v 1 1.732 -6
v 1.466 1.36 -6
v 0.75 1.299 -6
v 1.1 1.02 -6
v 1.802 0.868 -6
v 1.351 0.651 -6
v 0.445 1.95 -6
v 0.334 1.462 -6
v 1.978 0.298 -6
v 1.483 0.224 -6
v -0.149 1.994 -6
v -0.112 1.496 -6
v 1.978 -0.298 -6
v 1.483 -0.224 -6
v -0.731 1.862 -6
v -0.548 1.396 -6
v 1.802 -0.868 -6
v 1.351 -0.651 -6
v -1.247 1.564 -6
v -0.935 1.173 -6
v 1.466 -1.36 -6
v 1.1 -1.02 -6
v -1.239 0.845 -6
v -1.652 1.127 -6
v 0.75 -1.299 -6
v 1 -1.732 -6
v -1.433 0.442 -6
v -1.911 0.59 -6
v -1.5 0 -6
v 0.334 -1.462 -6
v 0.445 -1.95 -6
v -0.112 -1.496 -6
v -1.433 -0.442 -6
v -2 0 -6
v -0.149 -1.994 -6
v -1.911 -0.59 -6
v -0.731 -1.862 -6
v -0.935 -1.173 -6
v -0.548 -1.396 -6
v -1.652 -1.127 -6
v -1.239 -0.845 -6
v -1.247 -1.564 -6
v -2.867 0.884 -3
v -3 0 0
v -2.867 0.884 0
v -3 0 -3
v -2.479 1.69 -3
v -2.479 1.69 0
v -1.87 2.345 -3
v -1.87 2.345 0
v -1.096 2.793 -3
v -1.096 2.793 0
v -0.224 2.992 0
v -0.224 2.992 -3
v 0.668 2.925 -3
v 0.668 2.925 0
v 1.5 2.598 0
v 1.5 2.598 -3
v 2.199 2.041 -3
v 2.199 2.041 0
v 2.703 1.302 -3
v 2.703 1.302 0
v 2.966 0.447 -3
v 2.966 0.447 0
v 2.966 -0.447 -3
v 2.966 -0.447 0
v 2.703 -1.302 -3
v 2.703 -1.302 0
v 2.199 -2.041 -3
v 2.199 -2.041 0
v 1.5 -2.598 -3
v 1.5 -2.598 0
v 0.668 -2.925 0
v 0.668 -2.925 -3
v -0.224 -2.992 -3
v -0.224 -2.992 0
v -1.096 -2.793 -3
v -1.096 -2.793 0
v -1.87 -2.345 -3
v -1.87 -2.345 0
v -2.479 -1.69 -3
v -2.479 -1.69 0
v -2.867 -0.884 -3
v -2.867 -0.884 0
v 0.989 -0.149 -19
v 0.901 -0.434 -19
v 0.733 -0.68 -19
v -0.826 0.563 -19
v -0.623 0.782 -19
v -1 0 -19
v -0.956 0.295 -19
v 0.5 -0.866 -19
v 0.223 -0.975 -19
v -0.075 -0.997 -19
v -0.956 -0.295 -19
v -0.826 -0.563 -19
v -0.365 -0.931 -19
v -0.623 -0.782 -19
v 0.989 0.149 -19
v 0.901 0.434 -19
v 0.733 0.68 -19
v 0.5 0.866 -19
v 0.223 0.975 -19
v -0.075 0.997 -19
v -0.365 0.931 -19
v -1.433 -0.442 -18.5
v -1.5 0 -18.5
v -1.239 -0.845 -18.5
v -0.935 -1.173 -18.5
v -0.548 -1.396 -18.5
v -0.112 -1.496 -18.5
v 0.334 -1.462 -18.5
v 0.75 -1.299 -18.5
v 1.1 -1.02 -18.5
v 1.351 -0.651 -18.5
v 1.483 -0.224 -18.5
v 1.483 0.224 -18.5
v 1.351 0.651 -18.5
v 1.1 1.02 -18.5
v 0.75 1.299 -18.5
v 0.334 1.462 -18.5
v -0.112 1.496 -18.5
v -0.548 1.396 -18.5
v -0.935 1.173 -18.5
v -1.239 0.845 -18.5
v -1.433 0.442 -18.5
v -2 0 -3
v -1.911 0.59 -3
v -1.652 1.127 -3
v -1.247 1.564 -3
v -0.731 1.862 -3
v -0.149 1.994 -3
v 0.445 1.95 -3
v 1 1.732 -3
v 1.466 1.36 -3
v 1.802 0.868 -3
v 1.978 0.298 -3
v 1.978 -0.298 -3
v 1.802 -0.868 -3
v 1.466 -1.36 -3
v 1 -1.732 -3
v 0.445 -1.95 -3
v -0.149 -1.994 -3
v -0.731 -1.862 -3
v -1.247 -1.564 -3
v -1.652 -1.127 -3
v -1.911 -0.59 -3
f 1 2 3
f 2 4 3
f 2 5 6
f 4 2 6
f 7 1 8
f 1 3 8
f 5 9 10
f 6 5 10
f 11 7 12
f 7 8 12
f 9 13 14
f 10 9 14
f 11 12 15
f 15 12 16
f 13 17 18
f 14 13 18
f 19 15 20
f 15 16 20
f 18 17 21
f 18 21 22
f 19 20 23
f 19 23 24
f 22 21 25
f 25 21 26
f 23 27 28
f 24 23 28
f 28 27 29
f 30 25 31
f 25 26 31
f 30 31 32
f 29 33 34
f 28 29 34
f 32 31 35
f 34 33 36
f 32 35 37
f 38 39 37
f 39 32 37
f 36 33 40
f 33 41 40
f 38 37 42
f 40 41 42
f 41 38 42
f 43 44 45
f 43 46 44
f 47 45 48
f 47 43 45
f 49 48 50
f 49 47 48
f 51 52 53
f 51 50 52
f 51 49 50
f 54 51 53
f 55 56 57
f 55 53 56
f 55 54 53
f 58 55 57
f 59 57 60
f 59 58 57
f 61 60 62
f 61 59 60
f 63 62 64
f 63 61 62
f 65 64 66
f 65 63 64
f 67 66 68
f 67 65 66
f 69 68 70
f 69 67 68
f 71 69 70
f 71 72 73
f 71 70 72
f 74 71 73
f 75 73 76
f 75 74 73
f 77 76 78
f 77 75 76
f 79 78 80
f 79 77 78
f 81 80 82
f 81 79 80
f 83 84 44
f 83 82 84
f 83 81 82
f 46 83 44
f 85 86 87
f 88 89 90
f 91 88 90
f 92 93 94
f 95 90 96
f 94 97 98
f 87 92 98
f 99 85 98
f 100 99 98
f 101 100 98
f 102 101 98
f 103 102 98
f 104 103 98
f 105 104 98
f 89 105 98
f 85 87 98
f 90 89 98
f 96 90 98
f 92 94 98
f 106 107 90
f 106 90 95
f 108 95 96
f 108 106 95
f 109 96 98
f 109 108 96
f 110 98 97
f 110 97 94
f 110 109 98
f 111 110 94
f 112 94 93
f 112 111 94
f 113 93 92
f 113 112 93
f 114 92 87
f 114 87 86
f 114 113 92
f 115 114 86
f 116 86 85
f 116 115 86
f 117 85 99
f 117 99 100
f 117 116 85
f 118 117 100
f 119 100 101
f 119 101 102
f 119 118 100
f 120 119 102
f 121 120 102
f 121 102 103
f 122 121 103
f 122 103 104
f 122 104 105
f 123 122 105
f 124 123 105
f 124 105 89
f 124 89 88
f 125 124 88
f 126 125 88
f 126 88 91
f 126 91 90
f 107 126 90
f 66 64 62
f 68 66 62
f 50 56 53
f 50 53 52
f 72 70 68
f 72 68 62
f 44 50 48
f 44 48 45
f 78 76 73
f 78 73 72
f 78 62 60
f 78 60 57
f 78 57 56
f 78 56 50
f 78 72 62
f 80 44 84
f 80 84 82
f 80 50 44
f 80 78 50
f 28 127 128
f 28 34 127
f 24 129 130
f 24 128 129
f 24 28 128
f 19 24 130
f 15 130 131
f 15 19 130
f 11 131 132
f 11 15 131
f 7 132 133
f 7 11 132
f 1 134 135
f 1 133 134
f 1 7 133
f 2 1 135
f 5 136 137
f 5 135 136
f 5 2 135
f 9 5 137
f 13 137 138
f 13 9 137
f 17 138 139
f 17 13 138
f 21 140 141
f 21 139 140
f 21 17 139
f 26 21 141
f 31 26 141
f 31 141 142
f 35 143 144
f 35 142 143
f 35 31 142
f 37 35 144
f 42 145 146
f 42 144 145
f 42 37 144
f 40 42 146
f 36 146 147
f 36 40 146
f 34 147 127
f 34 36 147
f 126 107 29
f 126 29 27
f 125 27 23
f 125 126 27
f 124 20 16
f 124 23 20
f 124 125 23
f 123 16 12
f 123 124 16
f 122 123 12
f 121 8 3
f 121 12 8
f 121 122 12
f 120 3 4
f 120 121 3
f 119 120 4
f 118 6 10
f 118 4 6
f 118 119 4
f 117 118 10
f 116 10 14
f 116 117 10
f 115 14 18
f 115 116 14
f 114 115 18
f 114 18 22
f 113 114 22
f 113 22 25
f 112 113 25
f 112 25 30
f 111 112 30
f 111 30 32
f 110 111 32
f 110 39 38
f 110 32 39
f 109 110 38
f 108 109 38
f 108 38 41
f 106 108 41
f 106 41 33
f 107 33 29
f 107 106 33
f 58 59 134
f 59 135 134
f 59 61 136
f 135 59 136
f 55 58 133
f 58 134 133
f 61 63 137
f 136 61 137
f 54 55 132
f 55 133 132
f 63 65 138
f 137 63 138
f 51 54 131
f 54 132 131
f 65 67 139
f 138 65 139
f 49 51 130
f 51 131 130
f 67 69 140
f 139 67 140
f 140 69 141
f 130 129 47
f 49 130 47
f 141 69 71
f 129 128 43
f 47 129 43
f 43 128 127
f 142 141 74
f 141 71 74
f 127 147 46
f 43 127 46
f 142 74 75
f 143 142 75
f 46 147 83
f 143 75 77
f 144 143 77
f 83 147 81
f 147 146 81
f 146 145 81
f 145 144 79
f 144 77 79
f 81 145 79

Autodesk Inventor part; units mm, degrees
ref_plane "YZ Plane" through (0, 0, 0) normal (1, 0, 0) x (0, 1, 0)
ref_plane "XZ Plane" through (0, 0, 0) normal (0, 1, 0) x (-1, 0, 0)
ref_plane "XY Plane" through (0, 0, 0) normal (0, 0, 1) x (1, 0, 0)
sketch "Эскиз1" plane through (0, 0, 0) normal (0, 1, 0) x (-1, 0, 0)
  line L0 (0, 0) -> (3, 0)
  line L1 (3, 0) -> (3, -3)
  line L2 (0, -3) -> (1.5, -3)
  line L3 (1.5, -6) -> (1.5, -19)
  line L4 (1.5, -19) -> (0, -19)
  line L5 (0, -19) -> (0, 0)
  line L6 (1.5, -3) -> (3, -3)
  line L7 (1.5, -3) -> (2, -3)
  line L8 (2, -3) -> (2, -6)
  line L9 (2, -6) -> (0, -6)
  dimension "d0" = 3
  dimension "d1" = 3
  dimension "d2" = 1.5
  dimension "d3" = 16
  dimension "d4" = 0.5
  dimension "d5" = 3
revolve "Вращение1" add sketch "Эскиз1" angle 360 about axis through (0, 0, -19) along (0, 0, 1)
thread "Резьба1" size "M3x0.5" class "6g" standard "ISO Metric profile" full length
chamfer "Фаска1" distance 0.5 angle 45 1 edges at (1.5, 0, -19)
properties part number "Болт М3х16"
